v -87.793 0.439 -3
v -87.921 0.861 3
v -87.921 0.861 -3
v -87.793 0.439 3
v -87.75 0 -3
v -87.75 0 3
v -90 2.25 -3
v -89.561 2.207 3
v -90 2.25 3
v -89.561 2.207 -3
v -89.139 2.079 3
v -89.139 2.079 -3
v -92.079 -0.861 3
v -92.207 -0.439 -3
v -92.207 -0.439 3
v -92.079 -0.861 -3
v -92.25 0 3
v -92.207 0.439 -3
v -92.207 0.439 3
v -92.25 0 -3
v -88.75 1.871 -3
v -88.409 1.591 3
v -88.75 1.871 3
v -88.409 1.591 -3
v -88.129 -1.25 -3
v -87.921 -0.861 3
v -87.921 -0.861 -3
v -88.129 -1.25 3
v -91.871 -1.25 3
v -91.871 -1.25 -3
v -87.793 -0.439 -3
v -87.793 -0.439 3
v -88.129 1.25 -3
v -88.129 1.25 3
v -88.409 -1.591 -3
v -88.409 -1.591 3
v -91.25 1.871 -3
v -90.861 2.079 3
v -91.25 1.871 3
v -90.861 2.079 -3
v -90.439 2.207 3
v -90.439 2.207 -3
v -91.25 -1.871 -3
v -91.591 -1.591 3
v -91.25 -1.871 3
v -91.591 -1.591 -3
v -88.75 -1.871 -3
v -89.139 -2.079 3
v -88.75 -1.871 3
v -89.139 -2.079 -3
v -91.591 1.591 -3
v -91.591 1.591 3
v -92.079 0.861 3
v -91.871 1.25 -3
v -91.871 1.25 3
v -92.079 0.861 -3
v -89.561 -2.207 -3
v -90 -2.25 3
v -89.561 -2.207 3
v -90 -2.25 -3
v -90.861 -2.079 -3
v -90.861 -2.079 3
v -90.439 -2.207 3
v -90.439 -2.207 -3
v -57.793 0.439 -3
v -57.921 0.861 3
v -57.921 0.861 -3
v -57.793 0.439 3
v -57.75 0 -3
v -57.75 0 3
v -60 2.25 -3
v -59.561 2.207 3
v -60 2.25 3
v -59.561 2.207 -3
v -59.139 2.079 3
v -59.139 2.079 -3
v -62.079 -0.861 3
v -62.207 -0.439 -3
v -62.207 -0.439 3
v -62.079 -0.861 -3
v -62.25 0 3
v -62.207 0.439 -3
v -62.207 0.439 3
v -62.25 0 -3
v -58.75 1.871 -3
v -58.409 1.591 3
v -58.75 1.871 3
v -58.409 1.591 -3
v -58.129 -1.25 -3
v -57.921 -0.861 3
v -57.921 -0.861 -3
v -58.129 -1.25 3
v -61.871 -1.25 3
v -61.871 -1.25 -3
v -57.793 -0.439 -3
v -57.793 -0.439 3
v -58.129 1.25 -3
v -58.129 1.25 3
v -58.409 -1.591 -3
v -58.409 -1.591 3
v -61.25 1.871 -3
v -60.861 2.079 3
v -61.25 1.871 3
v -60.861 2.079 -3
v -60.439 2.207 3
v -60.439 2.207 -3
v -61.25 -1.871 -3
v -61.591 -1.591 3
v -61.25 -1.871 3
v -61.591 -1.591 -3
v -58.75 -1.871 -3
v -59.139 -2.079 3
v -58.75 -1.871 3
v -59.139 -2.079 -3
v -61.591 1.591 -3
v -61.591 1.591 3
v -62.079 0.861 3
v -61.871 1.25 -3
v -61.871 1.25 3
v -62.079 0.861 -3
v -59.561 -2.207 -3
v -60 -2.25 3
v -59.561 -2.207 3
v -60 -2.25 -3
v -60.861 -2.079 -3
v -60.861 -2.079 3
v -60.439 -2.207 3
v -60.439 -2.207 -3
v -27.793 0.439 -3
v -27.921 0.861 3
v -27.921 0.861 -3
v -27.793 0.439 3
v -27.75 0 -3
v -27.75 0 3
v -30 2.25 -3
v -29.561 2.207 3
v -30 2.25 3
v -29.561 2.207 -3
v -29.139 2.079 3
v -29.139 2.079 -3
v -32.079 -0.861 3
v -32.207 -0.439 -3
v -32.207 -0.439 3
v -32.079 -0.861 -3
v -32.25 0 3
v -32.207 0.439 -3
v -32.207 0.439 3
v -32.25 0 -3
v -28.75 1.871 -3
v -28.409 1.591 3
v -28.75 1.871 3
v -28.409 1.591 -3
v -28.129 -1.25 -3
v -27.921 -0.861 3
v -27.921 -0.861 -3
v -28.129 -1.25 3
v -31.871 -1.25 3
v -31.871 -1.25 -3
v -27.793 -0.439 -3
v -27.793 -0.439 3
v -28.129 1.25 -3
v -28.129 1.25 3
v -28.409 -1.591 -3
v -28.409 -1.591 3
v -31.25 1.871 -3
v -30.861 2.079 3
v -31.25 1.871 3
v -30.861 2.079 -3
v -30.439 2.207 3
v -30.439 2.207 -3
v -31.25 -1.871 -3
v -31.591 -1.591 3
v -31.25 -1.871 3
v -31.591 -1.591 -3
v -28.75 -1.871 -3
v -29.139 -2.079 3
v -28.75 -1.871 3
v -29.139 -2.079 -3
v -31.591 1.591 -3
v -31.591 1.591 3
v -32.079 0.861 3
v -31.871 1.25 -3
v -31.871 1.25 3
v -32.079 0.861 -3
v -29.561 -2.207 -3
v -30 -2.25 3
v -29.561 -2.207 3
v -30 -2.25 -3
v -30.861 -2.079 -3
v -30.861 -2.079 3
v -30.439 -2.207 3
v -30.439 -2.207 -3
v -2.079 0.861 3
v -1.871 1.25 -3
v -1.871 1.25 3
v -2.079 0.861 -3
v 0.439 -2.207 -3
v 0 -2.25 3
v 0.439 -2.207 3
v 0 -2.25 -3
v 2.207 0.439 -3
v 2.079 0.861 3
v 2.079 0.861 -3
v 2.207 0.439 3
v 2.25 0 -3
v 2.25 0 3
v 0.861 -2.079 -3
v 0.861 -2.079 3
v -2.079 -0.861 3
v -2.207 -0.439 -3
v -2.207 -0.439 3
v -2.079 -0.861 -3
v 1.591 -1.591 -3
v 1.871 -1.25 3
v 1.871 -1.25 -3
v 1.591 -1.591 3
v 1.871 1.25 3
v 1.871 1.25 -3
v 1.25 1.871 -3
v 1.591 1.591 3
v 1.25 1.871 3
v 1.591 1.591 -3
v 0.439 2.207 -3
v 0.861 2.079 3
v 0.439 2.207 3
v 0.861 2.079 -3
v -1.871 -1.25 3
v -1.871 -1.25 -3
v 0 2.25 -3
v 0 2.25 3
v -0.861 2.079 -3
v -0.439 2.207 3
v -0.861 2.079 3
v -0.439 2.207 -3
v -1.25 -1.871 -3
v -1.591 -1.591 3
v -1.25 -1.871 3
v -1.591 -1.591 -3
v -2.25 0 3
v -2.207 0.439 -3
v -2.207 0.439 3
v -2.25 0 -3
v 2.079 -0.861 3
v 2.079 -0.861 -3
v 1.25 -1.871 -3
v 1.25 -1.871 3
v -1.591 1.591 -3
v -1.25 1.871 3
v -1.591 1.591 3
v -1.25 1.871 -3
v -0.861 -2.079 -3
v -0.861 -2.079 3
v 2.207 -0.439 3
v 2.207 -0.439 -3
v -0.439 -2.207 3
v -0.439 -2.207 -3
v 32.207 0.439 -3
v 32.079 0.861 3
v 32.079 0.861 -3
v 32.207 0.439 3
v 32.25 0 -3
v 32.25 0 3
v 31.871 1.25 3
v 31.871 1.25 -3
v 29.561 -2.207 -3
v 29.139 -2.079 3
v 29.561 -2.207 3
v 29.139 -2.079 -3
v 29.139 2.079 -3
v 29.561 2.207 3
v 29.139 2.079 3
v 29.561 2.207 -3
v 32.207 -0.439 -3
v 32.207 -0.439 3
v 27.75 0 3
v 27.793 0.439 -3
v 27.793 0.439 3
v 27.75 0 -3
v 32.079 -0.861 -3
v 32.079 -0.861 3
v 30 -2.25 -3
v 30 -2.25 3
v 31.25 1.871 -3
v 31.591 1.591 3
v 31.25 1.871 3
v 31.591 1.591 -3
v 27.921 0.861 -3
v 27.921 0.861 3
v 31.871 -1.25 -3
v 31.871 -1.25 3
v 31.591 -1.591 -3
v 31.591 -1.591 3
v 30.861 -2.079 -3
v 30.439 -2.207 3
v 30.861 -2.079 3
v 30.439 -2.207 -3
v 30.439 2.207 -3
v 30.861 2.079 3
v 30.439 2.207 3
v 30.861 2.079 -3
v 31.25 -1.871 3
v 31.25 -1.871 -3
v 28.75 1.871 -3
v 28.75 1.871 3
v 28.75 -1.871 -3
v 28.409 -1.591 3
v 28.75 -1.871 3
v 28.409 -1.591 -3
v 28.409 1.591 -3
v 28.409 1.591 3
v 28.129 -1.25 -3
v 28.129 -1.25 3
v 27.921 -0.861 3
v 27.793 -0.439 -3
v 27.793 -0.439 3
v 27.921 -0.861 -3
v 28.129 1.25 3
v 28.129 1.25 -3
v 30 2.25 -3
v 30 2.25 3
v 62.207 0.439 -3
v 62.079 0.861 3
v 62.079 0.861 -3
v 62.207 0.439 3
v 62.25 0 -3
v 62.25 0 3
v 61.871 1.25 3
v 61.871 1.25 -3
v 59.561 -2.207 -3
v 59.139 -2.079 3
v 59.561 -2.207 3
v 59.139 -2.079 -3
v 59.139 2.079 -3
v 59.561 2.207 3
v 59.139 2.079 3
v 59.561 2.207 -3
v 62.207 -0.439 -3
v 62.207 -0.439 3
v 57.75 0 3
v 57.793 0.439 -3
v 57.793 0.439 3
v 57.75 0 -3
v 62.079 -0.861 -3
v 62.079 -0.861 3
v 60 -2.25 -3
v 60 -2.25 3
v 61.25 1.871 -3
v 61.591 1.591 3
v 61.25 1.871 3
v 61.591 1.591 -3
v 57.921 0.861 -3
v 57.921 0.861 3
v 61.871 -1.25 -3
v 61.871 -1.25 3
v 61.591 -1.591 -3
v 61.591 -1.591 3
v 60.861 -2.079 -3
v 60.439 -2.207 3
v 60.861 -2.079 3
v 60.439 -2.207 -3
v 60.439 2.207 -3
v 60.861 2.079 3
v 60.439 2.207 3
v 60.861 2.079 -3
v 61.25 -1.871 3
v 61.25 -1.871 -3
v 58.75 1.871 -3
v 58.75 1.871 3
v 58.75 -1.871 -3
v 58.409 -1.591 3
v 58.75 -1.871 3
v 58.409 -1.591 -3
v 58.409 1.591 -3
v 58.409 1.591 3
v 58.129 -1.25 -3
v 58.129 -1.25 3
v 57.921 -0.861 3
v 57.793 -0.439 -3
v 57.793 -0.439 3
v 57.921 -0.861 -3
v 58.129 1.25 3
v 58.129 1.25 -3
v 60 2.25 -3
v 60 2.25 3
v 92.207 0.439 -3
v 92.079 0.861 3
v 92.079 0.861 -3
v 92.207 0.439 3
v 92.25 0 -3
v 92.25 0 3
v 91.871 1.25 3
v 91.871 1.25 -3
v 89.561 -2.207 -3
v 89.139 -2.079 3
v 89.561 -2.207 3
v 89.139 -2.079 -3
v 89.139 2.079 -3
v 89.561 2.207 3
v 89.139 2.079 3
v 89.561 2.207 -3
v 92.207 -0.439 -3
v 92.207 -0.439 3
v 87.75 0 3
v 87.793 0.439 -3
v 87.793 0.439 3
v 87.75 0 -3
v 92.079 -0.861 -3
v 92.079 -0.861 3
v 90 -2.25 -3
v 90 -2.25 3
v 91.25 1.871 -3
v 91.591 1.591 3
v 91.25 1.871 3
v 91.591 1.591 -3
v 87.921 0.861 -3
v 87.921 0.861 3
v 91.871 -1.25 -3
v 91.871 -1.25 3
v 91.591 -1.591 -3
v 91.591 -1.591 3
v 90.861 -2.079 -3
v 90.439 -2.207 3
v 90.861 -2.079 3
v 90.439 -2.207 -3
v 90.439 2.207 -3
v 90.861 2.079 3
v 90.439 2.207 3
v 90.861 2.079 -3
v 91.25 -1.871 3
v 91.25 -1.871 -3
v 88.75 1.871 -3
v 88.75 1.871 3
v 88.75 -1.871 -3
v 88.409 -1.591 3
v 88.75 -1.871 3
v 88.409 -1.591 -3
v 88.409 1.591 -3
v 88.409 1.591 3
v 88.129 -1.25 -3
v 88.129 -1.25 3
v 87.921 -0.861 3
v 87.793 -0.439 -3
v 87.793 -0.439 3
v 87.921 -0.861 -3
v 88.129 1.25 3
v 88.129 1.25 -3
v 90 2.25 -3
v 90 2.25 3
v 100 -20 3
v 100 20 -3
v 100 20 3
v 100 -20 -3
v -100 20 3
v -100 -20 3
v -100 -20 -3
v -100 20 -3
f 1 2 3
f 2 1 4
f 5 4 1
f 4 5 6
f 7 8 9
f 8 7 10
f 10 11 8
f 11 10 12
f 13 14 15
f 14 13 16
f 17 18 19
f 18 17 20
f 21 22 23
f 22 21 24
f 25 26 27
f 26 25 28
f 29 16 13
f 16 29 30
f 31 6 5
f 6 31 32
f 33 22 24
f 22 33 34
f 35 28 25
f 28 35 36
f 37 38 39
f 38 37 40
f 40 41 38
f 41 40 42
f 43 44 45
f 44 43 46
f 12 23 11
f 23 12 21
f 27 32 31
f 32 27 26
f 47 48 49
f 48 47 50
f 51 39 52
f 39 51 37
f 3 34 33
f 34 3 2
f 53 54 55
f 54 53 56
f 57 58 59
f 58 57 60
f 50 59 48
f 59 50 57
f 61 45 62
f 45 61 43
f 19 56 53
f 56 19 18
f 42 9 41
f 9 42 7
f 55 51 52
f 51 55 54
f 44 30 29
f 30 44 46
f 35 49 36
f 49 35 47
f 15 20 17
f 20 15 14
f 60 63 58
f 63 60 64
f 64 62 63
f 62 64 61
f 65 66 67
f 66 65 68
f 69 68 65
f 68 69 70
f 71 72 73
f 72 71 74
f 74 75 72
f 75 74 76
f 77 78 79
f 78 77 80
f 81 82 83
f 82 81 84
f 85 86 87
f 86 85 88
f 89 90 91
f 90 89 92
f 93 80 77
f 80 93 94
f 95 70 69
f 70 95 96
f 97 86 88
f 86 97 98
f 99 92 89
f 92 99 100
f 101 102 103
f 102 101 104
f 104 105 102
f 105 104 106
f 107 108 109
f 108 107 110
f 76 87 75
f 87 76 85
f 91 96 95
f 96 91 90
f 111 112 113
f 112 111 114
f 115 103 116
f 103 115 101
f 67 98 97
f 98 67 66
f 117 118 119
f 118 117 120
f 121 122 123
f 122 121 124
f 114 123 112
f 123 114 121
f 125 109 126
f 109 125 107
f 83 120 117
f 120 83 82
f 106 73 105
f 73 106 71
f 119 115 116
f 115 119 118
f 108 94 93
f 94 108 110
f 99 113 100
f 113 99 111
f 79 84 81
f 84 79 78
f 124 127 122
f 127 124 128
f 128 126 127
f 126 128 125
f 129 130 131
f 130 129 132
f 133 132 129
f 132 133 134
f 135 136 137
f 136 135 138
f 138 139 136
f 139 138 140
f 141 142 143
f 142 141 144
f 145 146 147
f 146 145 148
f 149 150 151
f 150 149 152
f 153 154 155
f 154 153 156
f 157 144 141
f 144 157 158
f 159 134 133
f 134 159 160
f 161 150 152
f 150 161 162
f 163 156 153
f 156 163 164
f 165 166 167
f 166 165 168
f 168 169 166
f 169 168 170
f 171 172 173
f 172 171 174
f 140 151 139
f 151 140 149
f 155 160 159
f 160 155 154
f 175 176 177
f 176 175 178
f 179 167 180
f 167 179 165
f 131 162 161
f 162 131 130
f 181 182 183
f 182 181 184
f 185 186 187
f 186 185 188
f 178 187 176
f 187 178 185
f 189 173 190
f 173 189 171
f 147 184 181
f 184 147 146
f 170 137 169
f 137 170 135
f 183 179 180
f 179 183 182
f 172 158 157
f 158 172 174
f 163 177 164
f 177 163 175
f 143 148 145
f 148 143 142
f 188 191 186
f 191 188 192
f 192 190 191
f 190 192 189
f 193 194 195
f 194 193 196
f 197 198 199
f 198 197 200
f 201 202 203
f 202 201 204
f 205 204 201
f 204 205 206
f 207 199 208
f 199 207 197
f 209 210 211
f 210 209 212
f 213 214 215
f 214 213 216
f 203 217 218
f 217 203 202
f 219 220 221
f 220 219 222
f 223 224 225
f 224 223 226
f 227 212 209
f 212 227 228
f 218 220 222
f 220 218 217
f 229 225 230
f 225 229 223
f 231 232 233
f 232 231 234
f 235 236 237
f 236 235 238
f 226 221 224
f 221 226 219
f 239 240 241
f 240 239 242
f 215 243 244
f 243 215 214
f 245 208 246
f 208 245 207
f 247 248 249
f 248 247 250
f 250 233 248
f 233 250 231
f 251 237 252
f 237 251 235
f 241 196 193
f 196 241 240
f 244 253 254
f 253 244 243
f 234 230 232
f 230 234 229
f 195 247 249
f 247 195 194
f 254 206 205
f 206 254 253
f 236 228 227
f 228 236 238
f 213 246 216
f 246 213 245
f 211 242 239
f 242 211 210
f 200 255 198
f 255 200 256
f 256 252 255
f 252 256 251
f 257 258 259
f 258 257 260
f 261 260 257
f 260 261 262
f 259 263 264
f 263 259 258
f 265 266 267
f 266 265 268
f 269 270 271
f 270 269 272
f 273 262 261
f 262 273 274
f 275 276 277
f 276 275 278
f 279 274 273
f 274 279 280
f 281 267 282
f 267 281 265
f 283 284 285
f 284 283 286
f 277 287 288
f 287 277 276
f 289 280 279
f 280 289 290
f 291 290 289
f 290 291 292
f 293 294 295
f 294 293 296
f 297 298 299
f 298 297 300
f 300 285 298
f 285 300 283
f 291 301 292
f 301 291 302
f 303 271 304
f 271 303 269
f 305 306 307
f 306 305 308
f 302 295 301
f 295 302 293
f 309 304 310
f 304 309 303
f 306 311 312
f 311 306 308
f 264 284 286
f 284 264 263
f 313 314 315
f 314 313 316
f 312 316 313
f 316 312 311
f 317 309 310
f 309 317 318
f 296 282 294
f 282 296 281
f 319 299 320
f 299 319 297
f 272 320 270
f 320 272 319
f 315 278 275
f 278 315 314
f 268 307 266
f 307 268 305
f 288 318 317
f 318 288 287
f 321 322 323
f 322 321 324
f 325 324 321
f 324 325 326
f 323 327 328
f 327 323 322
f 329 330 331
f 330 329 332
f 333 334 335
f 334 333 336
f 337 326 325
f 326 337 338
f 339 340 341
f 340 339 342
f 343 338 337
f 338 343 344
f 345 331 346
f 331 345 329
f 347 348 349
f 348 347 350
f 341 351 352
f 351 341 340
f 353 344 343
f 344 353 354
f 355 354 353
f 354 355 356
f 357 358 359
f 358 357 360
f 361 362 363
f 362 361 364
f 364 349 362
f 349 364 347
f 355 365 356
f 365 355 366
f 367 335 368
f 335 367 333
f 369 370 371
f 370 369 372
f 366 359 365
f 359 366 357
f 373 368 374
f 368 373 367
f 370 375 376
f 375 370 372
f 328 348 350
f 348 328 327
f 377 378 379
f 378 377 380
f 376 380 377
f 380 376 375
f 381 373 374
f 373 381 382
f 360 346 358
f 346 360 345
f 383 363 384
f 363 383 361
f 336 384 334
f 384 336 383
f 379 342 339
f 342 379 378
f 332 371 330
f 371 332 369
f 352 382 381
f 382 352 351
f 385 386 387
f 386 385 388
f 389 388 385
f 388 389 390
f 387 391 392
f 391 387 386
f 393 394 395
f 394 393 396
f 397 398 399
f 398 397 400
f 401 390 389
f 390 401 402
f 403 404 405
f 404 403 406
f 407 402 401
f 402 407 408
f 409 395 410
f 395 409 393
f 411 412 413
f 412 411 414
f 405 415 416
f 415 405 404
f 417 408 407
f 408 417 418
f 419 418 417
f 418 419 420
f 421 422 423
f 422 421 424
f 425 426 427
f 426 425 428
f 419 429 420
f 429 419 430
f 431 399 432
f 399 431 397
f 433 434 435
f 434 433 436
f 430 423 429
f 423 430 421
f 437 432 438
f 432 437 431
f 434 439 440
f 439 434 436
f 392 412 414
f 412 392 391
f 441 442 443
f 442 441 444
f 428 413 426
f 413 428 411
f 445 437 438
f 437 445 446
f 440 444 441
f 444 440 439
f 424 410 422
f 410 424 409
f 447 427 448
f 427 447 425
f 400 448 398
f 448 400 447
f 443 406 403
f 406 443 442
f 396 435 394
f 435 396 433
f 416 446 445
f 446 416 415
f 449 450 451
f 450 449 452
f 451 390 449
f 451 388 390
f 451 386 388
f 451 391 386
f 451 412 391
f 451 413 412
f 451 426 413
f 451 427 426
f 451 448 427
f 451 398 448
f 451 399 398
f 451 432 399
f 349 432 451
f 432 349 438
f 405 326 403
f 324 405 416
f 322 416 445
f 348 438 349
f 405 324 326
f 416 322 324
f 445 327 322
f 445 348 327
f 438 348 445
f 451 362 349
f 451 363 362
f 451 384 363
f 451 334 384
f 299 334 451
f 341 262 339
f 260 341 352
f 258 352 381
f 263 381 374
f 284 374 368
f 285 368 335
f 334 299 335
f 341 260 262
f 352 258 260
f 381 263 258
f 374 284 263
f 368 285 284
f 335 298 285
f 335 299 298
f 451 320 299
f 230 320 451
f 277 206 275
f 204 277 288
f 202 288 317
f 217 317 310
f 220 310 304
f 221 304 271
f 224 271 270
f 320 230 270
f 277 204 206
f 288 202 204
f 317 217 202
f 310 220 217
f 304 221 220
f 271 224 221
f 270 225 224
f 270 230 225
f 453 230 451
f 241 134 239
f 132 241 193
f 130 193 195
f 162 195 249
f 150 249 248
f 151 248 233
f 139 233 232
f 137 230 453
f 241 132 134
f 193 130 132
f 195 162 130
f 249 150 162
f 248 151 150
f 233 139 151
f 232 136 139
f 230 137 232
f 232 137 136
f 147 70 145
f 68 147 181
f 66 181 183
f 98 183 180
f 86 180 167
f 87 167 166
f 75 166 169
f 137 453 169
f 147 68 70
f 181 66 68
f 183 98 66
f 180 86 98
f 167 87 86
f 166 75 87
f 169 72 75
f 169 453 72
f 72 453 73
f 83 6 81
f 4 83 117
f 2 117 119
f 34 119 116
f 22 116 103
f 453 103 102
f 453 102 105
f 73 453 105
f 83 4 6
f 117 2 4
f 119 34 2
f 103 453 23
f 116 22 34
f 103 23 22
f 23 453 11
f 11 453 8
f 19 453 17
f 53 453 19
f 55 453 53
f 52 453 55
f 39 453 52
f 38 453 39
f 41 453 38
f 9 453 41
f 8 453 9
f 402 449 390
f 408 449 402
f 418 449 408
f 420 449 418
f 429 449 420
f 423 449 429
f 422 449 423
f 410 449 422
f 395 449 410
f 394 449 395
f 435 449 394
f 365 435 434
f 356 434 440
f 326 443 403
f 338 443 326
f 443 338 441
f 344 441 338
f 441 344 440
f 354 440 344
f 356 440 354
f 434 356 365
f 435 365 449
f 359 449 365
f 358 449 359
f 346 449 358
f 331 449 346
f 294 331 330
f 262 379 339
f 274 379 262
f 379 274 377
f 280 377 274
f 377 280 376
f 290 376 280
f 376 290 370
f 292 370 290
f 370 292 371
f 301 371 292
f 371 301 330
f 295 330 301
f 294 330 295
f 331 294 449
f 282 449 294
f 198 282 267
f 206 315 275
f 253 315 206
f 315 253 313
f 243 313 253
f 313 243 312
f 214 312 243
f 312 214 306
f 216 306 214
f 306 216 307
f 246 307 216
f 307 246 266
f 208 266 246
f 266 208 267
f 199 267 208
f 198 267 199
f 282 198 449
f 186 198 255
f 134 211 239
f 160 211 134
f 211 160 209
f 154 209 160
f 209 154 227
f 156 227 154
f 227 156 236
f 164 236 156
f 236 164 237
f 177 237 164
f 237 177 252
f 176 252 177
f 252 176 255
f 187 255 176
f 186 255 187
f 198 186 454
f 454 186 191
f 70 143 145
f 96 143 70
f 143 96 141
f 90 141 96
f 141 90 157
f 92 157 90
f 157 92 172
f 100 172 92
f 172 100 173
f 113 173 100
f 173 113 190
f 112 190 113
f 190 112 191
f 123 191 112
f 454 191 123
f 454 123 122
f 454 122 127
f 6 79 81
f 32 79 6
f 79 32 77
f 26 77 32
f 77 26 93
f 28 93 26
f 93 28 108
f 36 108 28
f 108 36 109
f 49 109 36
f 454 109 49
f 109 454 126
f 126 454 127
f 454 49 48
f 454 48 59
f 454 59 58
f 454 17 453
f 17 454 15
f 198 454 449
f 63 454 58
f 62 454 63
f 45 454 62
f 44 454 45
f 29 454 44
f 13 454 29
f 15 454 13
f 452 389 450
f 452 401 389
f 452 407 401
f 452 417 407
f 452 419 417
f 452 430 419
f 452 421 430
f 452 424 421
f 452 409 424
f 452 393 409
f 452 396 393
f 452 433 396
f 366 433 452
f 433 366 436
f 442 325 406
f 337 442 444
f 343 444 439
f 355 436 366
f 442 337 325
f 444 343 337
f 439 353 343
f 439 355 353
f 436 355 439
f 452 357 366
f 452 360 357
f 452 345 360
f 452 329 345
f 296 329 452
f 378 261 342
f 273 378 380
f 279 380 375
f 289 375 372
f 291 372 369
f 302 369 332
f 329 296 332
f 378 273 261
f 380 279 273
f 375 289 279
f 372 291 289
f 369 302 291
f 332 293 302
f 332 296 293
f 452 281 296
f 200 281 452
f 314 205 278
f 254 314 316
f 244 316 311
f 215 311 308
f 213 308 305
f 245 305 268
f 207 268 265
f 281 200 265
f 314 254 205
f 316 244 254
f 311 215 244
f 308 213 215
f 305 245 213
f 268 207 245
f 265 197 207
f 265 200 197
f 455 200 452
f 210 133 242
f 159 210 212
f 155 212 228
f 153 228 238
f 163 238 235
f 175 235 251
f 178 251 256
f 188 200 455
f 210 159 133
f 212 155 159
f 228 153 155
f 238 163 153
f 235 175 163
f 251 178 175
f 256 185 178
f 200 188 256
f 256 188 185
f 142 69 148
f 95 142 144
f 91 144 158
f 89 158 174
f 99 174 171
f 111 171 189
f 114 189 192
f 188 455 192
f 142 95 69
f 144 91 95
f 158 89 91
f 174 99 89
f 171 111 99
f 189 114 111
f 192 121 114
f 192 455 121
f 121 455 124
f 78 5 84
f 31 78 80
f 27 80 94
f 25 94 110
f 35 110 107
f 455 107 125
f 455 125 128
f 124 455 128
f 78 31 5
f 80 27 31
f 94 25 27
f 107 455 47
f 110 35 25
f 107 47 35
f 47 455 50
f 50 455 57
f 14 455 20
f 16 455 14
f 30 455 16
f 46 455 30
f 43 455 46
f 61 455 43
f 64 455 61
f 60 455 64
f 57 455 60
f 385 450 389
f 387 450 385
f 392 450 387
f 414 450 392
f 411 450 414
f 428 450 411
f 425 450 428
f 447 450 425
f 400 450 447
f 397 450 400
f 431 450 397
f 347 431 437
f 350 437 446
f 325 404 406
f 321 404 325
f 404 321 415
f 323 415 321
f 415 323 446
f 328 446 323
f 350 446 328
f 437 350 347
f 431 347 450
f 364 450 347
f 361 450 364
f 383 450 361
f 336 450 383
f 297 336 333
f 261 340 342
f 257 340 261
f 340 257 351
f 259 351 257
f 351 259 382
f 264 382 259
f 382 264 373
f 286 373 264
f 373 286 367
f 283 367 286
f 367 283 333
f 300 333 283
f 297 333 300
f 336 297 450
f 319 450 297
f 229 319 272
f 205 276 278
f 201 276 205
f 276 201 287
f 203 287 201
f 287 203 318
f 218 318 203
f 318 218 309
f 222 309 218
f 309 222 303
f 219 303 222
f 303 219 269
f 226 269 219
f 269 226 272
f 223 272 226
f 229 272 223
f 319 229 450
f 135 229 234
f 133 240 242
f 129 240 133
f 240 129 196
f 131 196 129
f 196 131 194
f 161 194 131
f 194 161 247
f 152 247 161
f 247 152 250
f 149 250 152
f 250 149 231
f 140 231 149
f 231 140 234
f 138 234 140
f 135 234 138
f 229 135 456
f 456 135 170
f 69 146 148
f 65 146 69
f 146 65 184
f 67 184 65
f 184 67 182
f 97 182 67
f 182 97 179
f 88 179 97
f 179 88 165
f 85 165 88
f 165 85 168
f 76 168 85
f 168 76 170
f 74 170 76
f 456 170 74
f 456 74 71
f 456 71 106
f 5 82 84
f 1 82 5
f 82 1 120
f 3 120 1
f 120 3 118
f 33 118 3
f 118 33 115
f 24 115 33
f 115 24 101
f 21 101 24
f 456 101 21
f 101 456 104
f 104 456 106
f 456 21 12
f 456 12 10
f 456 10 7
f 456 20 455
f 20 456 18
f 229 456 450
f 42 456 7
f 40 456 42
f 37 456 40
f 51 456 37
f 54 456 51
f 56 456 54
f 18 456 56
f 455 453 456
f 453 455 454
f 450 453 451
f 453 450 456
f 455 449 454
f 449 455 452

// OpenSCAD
$fn = 32;

// ----------------------------------------------------------------------
// Hole bar, 7 x Ø4.5
// row layout, 10 mm edge offset
// ----------------------------------------------------------------------

// --- parameters (mm) ---
bar_w = 40;    // bar width (Y)
bar_t = 6;     // bar thickness (Z)
holes = 7;     // holes per row
hole_d = 4.5;  // hole diameter
edge = 10;     // offset from the bar end to the first hole
pitch = 30;    // pitch between neighbouring holes

// --- derived feature positions (mm) ---
span = (holes - 1) * pitch;   // = 180   distance between the end holes
bar_l = span + 2 * edge;      // = 200   overall bar length
start_x = -bar_l / 2 + edge;  // = -90   X of the first hole
feature_centers = [
  [start_x + 0 * pitch, 0],
  [start_x + 1 * pitch, 0],
  [start_x + 2 * pitch, 0],
  [start_x + 3 * pitch, 0],
  [start_x + 4 * pitch, 0],
  [start_x + 5 * pitch, 0],
  [start_x + 6 * pitch, 0]
];   // hole centres of the first row

// bar with one row of holes, drilled from feature_centers
difference() {
  translate([-bar_l / 2, -bar_w / 2, -bar_t / 2]) cube([bar_l, bar_w, bar_t]);
  for (centre = feature_centers)
    translate([centre[0], centre[1], 0])
      cylinder(d = hole_d, h = bar_t + 2, center = true);
}
